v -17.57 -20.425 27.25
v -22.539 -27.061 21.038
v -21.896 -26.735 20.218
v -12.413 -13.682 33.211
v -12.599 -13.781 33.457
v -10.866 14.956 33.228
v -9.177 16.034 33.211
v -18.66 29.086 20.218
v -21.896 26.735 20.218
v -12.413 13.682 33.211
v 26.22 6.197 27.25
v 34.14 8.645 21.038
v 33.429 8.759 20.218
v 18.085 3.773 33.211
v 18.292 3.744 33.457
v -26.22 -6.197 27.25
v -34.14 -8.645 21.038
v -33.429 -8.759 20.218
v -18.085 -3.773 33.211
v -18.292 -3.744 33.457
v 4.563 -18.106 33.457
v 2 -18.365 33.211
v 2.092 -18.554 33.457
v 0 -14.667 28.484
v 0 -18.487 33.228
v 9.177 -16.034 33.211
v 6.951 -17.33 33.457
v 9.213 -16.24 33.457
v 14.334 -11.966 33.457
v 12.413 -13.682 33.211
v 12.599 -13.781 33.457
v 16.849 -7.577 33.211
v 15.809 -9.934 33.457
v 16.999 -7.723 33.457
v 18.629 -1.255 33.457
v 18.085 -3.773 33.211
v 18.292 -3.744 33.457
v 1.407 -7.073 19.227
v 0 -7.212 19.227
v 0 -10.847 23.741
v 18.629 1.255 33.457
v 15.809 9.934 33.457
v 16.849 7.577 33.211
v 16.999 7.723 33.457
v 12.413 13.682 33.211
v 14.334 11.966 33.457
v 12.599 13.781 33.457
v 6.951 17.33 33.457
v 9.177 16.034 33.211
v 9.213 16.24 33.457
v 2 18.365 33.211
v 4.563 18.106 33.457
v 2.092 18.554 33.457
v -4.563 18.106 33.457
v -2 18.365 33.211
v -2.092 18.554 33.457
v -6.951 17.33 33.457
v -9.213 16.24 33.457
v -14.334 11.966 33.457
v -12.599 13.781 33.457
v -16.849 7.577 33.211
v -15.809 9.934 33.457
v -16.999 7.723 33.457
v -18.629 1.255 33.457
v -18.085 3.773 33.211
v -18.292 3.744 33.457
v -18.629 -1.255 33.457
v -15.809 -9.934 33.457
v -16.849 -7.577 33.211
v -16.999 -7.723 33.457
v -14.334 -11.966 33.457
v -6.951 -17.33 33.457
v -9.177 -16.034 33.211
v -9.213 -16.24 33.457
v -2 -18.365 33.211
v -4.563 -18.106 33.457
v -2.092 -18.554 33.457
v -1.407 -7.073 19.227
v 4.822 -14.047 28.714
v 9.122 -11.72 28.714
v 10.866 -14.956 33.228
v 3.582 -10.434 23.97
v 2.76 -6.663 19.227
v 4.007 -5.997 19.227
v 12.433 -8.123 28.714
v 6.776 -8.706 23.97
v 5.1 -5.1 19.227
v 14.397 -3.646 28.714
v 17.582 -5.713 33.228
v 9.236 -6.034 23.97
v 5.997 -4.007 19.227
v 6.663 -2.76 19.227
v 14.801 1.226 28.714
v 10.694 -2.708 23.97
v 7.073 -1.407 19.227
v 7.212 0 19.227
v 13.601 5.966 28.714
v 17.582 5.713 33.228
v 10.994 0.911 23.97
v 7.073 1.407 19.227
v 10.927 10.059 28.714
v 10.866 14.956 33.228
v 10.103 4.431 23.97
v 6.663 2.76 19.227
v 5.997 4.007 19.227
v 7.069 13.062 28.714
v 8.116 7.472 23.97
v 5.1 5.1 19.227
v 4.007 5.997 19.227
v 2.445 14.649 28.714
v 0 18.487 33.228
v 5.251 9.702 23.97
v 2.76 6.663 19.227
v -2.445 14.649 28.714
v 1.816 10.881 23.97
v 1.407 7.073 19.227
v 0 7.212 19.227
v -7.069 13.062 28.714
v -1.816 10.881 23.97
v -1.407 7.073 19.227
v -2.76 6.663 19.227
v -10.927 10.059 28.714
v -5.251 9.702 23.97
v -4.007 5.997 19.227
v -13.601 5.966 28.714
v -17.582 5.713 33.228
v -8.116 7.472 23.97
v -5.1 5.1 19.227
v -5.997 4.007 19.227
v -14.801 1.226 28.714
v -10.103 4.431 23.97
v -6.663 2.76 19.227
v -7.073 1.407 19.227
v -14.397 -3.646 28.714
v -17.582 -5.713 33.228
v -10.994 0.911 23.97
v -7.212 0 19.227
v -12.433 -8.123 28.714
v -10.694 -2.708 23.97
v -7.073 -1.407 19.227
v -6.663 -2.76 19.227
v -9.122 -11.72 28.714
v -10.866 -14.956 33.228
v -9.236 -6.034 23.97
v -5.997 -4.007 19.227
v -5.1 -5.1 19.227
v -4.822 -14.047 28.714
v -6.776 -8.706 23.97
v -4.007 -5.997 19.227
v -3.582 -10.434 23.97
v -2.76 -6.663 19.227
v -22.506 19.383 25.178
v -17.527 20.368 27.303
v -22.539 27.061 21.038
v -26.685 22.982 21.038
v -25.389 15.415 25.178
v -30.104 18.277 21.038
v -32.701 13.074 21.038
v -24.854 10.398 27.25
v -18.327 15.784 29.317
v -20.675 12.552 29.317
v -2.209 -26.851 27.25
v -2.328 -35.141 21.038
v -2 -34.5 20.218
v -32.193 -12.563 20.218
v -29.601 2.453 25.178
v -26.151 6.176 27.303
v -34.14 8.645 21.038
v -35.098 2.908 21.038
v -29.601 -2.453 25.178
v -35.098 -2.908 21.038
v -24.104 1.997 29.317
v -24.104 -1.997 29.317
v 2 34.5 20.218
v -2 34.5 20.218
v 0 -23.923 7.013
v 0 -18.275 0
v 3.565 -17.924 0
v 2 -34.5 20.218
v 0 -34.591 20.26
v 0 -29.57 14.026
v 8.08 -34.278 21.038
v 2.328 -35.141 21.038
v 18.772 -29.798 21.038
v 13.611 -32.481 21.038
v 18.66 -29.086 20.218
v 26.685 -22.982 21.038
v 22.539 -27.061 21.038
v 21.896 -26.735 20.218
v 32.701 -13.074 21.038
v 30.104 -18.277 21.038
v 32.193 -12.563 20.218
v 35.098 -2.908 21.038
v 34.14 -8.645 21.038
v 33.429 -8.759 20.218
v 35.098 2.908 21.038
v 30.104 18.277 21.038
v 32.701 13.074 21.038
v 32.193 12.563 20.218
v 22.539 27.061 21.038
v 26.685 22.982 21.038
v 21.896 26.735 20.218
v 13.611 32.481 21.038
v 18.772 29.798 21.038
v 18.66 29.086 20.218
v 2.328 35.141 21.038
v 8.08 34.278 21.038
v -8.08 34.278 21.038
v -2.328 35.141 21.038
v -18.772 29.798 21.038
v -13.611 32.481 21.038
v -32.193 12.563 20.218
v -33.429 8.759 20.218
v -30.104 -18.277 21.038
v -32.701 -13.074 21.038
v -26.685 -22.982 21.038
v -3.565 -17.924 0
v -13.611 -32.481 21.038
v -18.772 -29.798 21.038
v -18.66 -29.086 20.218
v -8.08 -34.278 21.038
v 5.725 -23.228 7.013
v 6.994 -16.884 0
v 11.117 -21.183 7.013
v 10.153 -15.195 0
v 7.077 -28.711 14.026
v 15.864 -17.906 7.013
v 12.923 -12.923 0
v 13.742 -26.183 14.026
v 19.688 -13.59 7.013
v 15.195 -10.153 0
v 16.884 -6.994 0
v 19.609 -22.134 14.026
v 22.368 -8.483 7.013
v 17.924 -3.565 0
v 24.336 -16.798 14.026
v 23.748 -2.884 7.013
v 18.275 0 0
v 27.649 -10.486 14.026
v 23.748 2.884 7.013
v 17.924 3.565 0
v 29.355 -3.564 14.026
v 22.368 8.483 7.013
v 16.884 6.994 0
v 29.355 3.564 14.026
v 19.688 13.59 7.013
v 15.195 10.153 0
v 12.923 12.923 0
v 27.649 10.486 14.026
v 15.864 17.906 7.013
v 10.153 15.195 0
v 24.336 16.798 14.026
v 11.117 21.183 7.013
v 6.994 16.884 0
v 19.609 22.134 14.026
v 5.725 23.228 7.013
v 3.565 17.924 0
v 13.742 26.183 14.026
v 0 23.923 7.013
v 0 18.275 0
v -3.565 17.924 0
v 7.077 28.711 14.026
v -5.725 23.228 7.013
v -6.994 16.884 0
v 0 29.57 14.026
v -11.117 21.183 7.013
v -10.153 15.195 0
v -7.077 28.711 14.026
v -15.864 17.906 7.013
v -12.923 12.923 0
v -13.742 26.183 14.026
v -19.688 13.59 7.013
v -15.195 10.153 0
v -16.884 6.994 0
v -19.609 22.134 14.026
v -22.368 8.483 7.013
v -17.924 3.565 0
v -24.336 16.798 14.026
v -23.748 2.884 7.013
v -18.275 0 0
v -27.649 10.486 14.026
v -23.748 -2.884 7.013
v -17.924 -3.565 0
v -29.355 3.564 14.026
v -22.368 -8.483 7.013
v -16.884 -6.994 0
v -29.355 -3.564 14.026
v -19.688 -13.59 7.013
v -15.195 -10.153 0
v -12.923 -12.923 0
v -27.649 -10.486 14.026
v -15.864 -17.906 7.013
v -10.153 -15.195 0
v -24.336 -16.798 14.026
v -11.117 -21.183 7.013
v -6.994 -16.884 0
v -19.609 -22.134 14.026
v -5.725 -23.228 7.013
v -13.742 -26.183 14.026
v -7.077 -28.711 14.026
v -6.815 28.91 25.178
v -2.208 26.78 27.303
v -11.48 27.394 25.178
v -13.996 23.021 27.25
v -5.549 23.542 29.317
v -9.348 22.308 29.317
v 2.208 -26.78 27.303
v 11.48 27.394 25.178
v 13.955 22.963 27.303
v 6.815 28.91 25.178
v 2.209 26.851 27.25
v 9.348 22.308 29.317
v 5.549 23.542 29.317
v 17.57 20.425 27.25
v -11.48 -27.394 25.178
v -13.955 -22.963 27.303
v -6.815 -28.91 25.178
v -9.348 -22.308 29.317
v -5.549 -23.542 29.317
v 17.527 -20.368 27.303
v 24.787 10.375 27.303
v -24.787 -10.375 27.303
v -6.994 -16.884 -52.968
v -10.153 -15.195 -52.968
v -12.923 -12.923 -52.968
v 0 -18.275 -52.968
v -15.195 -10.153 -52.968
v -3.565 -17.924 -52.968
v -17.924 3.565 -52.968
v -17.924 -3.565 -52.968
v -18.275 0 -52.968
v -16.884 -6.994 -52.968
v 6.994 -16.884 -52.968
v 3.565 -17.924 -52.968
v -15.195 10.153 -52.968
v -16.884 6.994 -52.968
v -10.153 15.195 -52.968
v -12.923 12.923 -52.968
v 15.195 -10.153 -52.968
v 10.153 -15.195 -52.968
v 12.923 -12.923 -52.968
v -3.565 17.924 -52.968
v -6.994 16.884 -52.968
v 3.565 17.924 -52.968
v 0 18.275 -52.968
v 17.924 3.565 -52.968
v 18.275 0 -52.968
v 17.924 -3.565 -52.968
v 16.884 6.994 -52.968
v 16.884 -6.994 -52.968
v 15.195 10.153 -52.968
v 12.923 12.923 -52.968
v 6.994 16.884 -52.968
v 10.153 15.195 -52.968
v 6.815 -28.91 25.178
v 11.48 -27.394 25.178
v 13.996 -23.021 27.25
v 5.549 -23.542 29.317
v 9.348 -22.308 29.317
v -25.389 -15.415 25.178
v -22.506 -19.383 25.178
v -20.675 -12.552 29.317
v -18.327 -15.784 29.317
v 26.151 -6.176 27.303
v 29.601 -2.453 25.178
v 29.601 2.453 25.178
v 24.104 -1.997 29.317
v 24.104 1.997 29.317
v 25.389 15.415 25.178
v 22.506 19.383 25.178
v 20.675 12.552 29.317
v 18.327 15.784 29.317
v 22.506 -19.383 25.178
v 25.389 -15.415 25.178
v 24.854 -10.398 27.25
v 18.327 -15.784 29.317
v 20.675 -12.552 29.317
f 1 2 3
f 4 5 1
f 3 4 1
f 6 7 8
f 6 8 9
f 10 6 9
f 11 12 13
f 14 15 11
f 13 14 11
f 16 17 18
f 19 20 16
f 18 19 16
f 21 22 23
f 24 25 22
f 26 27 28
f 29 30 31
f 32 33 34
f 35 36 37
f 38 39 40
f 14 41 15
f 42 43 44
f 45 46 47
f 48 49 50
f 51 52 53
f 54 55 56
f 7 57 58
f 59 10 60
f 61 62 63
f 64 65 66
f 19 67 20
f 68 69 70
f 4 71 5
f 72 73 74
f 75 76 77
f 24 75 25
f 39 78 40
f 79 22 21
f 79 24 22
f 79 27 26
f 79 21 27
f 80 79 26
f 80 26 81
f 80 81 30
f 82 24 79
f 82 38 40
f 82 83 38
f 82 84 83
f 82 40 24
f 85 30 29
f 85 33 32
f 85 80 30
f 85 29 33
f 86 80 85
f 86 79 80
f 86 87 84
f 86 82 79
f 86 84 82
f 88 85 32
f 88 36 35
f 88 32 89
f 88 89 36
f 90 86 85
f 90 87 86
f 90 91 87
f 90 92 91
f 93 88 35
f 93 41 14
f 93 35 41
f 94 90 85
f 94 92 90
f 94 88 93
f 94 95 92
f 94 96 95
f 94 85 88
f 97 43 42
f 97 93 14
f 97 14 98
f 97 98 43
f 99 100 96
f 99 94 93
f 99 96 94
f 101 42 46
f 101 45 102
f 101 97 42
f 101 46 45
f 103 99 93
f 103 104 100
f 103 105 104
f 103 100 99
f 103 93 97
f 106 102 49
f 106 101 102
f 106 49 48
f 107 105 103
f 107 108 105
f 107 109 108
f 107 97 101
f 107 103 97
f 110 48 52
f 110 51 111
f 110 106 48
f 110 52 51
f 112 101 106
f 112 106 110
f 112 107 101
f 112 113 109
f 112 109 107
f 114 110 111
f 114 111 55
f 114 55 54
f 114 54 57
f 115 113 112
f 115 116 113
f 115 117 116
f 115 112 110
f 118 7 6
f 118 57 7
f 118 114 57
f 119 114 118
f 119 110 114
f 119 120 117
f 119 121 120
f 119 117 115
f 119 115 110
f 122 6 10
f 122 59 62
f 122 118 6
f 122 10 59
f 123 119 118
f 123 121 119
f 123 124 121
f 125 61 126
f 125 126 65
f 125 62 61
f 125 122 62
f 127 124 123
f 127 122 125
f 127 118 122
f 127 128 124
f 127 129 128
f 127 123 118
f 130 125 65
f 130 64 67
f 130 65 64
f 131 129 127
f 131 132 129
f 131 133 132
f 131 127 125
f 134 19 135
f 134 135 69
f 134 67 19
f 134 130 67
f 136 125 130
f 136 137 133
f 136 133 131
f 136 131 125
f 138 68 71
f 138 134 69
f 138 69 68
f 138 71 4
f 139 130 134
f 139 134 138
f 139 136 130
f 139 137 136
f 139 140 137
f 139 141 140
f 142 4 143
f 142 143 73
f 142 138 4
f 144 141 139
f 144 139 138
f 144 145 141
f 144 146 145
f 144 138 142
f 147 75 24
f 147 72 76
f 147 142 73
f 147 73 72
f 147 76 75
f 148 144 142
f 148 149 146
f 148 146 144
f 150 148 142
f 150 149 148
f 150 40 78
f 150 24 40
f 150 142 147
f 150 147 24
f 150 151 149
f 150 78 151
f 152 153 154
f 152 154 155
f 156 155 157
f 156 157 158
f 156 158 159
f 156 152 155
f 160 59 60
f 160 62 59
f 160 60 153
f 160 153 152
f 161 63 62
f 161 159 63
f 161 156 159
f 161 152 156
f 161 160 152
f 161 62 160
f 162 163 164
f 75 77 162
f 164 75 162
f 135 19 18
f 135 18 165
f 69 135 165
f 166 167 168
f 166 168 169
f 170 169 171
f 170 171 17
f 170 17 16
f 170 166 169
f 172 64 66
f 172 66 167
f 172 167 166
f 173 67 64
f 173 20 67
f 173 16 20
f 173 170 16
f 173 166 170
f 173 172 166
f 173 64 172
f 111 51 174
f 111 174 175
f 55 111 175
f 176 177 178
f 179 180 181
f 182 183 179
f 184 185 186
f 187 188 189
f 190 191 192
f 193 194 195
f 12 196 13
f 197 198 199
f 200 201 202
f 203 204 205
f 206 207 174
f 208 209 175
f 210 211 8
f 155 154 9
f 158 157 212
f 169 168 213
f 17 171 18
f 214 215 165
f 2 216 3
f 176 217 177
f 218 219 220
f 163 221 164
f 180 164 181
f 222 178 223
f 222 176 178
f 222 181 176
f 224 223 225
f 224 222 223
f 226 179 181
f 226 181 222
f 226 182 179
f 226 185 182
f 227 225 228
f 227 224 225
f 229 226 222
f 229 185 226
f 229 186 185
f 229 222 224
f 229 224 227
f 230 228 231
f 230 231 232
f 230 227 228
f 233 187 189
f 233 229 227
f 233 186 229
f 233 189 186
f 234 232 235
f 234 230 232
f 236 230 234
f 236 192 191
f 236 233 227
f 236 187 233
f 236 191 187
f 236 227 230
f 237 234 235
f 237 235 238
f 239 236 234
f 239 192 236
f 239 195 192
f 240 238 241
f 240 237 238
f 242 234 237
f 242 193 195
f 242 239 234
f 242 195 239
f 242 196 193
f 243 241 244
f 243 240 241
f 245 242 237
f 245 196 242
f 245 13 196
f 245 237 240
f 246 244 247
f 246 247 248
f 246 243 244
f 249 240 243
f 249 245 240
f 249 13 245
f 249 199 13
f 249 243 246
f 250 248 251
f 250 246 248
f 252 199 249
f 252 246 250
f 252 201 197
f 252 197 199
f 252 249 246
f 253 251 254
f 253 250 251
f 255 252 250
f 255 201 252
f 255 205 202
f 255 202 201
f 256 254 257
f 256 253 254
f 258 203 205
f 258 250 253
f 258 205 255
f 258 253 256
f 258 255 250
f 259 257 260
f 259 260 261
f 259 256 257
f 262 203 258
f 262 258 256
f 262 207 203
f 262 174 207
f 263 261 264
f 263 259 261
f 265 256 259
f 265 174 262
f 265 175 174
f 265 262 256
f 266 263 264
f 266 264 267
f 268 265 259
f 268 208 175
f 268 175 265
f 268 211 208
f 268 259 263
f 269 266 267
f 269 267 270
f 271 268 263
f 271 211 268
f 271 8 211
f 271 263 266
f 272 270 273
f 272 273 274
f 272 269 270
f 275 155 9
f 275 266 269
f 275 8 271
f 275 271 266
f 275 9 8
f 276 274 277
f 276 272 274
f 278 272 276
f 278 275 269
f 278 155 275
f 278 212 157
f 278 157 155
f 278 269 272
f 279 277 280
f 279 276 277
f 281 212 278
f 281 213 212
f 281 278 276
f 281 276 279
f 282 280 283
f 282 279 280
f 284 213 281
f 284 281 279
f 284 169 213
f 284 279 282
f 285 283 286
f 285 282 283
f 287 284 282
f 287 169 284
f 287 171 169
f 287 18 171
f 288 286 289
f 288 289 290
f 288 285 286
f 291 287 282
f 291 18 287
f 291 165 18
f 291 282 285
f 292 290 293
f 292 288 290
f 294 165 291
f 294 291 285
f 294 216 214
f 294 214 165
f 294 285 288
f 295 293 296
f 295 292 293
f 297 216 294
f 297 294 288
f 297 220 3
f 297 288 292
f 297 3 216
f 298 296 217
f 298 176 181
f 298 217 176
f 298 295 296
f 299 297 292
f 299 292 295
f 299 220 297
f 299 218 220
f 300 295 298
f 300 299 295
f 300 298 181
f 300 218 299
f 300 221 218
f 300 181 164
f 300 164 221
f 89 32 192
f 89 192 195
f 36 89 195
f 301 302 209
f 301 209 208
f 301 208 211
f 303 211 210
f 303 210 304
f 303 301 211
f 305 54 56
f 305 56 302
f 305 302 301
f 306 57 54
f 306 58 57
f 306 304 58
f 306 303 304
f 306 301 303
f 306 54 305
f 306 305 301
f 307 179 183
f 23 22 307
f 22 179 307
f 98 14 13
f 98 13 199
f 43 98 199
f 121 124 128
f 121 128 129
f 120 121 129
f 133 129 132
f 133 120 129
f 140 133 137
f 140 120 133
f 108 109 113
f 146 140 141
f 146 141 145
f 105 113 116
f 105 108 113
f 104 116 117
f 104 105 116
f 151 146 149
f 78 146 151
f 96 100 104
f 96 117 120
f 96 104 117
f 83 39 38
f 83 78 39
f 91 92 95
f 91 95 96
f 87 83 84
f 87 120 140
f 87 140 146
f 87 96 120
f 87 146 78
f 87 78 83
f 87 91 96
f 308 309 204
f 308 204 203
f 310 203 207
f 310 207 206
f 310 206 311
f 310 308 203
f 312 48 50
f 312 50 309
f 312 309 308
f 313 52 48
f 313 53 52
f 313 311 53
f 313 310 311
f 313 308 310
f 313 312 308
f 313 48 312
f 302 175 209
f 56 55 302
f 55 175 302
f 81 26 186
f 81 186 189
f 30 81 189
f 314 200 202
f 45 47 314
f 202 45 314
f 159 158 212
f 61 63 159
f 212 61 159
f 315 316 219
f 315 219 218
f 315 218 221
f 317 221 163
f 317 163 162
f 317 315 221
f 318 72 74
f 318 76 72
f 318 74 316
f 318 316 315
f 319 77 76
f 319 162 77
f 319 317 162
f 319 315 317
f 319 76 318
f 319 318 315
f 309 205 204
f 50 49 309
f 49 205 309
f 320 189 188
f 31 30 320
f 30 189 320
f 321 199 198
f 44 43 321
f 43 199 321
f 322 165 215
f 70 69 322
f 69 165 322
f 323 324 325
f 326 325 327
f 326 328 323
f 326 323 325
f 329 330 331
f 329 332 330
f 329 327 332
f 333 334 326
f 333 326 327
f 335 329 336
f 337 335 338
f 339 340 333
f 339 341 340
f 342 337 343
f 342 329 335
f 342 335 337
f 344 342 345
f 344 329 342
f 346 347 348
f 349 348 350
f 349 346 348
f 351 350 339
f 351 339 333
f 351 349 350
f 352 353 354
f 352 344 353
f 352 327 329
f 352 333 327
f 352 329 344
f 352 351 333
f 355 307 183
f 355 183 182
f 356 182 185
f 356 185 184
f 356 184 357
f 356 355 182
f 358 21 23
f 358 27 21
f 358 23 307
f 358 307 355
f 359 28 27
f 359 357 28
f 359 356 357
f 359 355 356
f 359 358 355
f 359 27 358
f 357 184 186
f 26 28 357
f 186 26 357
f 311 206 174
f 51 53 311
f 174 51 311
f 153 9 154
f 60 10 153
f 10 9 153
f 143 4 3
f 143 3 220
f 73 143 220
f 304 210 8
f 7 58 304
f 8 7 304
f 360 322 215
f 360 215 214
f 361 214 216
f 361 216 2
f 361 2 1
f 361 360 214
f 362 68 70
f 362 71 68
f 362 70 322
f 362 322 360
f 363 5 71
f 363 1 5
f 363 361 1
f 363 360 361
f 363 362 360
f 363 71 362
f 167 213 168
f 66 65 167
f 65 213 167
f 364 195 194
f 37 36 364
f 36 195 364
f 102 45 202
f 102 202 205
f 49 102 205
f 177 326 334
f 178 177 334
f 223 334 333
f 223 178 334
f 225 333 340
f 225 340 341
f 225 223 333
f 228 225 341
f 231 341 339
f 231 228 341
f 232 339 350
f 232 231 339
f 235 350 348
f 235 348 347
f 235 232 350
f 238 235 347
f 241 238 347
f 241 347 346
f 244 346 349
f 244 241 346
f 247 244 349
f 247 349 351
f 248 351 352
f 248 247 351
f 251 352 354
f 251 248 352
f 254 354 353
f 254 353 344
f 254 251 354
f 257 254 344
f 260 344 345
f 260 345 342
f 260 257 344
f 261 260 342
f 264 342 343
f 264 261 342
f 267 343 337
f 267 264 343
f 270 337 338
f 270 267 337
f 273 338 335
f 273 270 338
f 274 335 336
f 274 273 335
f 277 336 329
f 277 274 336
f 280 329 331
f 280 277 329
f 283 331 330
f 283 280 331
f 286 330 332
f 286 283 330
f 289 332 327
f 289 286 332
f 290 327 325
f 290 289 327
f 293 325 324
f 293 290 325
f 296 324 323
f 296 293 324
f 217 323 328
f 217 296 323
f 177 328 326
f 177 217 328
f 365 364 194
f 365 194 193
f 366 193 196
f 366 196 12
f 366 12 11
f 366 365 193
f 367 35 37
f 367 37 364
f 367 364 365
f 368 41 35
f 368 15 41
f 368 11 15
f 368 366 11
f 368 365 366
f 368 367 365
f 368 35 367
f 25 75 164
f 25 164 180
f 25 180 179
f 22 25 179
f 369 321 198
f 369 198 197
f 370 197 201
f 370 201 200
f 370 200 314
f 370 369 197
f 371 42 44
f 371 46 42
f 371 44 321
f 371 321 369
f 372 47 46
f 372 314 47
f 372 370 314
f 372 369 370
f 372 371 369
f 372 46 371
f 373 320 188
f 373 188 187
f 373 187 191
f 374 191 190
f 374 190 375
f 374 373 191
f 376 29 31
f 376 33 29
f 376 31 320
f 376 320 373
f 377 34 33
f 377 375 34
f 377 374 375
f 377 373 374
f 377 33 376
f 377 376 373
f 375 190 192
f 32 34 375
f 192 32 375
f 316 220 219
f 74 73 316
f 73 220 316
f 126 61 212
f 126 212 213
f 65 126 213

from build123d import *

# Parameters (mm, degrees)
POCKET001_DEPTH    = 335.850526
POLARPATTERN_COUNT = 10


with BuildPart() as part:
    # Sketch003 (on Sketch) → Revolution (revolve)
    with BuildSketch(Plane.YZ):
        Polygon((0, -52.968494), (-18.275258, -52.968494), (-18.275258, 0), (-35.217843, 21.038483), (-18.671614, 33.456837), (-7.212017, 19.226863), (0, 19.226863), align=None)
    revolve(axis=Axis((0, 0, 0), (0, 0, 1)))

    # Sketch004 (on Vertex5 of Revolution) → Pocket001 (cut, through all)
    with BuildSketch(Plane(origin=(0, -5.199434, 24.699477), x_dir=(-1, 0, 0), z_dir=(0, 0.778846, 0.627215))):
        with BuildLine():
            ThreePointArc((2, 14.887447), (0, 14.976512), (-2, 14.887447))
            ThreePointArc((-2, 14.887447), (-3.63932, 19.067787), (-6, 22.887447))
            ThreePointArc((6, 22.887447), (0, 23.473689), (-6, 22.887447))
            ThreePointArc((6, 22.887447), (3.63932, 19.067787), (2, 14.887447))
        make_face()
    pocket001 = extrude(amount=-POCKET001_DEPTH, mode=Mode.SUBTRACT)

    # PolarPattern: Pocket001 ×10 about axis
    polarpattern_axis = Axis((0, 0, 0), (0, 0, 1))
    for i in range(1, POLARPATTERN_COUNT):
        add(pocket001.rotate(polarpattern_axis, i * 360 / POLARPATTERN_COUNT), mode=Mode.SUBTRACT)


solid = part.part
